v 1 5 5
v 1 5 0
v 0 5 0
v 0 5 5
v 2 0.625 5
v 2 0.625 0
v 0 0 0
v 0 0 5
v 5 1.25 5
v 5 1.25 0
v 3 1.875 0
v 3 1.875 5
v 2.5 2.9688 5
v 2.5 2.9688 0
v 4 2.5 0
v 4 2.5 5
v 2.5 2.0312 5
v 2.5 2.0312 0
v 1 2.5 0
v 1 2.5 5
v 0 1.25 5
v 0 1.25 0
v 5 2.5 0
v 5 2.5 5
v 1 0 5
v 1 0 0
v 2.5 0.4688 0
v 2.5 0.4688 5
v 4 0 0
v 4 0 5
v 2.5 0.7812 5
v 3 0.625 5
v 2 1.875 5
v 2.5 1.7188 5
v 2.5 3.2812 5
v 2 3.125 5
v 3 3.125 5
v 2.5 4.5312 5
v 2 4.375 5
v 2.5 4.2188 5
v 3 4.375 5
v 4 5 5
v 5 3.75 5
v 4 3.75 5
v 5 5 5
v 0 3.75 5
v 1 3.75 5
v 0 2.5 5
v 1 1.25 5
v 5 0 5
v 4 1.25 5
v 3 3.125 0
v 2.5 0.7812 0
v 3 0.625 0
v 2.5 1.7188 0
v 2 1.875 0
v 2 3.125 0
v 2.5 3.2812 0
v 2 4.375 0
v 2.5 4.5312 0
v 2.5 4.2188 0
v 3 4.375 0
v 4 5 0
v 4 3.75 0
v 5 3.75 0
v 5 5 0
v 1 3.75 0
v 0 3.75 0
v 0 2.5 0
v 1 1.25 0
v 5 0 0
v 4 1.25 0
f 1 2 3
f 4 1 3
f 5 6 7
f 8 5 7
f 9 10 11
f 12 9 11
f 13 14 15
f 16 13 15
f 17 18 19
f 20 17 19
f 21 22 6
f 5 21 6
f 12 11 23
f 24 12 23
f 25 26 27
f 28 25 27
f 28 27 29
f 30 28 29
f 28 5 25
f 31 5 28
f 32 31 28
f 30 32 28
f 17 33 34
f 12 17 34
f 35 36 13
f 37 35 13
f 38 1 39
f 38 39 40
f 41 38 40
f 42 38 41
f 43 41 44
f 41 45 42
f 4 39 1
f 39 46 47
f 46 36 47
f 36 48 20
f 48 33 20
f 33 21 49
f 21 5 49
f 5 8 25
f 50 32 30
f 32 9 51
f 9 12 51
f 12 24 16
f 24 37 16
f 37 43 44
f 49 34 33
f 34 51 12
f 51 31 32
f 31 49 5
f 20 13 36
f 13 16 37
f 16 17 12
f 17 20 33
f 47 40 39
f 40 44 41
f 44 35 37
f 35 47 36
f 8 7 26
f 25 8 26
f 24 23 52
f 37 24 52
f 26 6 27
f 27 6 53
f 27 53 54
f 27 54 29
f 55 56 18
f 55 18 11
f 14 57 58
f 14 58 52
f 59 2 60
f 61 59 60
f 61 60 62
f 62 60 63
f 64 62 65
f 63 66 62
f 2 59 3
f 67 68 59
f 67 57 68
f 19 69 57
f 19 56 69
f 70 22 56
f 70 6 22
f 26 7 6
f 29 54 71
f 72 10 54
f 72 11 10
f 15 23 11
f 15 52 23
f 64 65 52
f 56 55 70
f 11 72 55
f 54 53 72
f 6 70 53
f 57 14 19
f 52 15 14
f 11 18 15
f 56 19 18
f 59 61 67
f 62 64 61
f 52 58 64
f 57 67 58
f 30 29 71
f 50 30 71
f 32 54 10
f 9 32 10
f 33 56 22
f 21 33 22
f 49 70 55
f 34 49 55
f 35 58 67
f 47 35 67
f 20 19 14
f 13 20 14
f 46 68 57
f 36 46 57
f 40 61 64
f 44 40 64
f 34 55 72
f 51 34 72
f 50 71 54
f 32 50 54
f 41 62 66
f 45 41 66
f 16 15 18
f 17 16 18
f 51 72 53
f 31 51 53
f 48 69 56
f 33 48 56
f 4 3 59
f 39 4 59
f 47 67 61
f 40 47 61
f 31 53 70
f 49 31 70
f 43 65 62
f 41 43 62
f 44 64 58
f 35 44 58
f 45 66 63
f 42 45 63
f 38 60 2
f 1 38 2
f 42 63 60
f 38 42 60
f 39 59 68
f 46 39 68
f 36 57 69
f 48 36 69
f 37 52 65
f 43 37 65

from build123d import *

# Parameters (mm, degrees)
BOSS_EXTRUDE2_DEPTH = 5


with BuildPart() as part:
    # Sketch1 → Boss-Extrude2 (new body)
    with BuildSketch(Plane.XY):
        Polygon((2, 0.625), (0, 0), (1, 0), (2.5, 0.46875), (4, 0), (5, 0), (3, 0.625), (5, 1.25), (3, 1.875), (5, 2.5), (3, 3.125), (5, 3.75), (3, 4.375), (5, 5), (4, 5), (2.5, 4.53125), (1, 5), (0, 5), (2, 4.375), (0, 3.75), (2, 3.125), (0, 2.5), (2, 1.875), (0, 1.25), align=None)
        Polygon((1, 1.25), (2.5, 1.71875), (4, 1.25), (2.5, 0.78125), align=None, mode=Mode.SUBTRACT)
        Polygon((2.5, 2.03125), (1, 2.5), (2.5, 2.96875), (4, 2.5), align=None, mode=Mode.SUBTRACT)
        Polygon((1, 3.75), (2.5, 4.21875), (4, 3.75), (2.5, 3.28125), align=None, mode=Mode.SUBTRACT)
    extrude(amount=BOSS_EXTRUDE2_DEPTH)


solid = part.part
